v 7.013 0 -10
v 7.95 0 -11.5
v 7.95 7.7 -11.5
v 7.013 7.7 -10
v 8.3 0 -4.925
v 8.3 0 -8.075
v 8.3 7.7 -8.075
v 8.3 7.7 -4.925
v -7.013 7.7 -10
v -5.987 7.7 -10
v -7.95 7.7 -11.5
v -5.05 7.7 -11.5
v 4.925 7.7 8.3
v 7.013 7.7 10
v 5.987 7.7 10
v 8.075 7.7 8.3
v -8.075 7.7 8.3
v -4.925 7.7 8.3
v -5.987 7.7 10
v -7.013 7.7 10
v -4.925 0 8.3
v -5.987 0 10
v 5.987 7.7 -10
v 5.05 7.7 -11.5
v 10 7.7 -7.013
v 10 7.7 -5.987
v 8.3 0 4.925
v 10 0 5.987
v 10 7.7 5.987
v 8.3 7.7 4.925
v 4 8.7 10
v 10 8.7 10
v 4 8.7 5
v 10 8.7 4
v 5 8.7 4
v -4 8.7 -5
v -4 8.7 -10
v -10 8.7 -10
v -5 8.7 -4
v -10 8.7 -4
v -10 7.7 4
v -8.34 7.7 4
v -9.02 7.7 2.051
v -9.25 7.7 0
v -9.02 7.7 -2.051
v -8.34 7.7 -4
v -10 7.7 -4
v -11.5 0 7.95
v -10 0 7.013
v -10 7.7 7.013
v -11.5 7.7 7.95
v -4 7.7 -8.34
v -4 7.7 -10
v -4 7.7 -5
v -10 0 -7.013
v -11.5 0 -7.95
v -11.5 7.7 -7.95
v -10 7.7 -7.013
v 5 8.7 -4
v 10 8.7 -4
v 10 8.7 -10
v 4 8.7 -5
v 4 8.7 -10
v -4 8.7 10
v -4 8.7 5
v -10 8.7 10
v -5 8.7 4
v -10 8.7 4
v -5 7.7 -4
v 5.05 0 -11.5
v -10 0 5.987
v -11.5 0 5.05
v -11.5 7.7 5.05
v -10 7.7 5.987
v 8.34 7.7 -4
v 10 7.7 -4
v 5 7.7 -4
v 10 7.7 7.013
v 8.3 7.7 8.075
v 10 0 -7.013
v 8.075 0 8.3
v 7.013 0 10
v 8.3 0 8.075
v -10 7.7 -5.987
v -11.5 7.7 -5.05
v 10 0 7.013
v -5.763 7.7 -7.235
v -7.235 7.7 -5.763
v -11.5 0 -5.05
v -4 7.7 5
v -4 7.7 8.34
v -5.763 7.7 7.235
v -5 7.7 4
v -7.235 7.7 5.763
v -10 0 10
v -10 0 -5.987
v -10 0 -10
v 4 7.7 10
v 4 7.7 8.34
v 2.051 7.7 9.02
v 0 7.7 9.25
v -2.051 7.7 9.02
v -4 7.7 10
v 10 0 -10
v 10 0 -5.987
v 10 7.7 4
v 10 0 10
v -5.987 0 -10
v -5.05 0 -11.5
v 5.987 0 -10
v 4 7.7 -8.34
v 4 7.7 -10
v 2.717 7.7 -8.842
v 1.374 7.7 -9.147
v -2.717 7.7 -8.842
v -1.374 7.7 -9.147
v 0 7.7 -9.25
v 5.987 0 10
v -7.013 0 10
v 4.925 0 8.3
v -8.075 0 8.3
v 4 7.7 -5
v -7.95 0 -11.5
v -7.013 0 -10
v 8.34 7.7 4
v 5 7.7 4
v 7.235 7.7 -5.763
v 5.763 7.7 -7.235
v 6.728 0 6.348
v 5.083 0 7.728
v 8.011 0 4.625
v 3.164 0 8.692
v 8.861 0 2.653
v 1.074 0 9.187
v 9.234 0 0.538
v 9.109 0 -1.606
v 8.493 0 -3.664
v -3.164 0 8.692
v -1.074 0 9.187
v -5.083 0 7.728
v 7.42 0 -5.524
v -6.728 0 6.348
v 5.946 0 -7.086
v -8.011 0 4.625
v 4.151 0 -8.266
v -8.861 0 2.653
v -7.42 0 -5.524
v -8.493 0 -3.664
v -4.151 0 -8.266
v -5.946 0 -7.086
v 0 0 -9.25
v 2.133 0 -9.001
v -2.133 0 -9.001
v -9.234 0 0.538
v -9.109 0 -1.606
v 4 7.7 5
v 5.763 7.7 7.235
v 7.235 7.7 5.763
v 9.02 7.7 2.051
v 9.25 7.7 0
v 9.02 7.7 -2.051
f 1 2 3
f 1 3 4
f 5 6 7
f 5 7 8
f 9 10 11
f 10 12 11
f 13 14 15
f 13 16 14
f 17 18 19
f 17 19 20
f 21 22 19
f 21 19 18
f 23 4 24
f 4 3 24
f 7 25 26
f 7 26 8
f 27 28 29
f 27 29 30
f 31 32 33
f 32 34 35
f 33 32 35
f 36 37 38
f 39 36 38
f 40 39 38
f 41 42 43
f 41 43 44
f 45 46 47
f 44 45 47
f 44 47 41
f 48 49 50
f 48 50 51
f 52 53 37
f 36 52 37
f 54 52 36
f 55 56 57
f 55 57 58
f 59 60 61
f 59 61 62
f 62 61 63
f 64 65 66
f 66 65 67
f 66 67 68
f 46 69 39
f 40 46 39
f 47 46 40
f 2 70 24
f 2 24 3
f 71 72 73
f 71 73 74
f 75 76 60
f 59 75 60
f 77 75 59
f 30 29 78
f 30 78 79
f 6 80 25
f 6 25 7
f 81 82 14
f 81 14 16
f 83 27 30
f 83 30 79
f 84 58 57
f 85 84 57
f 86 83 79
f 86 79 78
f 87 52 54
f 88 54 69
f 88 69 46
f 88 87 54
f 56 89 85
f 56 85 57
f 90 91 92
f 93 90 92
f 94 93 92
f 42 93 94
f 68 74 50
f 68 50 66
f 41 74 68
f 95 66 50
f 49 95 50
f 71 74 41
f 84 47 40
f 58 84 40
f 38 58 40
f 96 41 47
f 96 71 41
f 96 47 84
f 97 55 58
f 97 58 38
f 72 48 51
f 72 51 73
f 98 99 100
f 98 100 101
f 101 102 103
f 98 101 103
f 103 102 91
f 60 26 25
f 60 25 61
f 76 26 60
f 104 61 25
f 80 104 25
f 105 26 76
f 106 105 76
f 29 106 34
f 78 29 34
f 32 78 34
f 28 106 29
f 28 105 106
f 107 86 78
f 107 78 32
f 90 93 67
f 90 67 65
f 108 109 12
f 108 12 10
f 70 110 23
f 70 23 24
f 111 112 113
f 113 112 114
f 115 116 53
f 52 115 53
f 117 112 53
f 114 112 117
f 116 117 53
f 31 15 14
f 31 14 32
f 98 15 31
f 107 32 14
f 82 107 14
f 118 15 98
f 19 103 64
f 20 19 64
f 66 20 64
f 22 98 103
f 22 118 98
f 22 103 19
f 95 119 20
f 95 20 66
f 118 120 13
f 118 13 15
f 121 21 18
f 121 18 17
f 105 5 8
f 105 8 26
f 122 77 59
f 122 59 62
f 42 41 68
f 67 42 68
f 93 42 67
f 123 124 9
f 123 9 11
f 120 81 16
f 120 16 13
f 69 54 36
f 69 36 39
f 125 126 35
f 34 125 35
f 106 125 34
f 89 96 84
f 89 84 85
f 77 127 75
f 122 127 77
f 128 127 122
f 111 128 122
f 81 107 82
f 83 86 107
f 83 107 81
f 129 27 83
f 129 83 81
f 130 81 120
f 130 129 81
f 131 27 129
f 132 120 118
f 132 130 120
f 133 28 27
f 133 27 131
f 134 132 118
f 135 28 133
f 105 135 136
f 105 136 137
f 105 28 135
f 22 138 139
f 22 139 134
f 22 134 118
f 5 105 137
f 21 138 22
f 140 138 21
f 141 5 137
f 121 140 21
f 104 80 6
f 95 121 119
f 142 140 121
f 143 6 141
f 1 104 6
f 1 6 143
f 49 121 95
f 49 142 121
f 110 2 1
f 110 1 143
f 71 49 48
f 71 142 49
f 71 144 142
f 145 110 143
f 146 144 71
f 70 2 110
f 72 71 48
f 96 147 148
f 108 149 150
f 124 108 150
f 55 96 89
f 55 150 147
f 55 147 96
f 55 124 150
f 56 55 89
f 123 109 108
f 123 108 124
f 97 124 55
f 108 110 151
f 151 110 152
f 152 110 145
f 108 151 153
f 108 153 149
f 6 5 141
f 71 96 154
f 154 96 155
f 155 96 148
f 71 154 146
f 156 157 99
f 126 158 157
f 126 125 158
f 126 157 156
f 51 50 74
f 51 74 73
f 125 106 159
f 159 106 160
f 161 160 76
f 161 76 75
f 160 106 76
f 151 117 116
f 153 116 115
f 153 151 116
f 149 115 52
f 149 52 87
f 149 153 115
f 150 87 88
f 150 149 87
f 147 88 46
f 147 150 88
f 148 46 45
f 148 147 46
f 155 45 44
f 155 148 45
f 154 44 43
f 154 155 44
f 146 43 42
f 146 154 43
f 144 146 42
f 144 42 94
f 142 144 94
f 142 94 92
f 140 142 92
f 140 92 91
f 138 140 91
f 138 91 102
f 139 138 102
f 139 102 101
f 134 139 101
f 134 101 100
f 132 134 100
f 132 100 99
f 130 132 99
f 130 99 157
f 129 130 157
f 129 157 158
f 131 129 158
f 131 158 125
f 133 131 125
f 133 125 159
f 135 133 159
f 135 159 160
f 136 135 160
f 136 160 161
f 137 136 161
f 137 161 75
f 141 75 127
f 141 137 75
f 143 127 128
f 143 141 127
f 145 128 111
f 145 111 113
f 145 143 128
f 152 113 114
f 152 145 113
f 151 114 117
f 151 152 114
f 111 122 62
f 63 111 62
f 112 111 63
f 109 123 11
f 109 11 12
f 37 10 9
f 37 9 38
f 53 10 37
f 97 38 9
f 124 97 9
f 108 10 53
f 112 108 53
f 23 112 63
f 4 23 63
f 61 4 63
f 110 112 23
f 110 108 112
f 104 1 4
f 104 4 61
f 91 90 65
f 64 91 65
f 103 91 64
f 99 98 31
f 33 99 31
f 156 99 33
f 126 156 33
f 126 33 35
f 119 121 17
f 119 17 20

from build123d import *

# Parameters (mm, degrees)
SKETCH1_R           = 9.25
BOSS_EXTRUDE1_DEPTH = 7.7
BOSS_EXTRUDE2_DEPTH = 1


with BuildPart() as part:
    # Sketch1 → Boss-Extrude1 (new body)
    with BuildSketch(Plane(origin=(0, 0, 0), x_dir=(1, 0, 0), z_dir=(0, 1, 0))):
        Polygon((-7.012695972, 10), (-7.95, 11.5), (-5.05, 11.5), (-5.987304028, 10), (5.987304028, 10), (5.05, 11.5), (7.95, 11.5), (7.012695972, 10), (10, 10), (10, 7.012695972), (8.3, 8.07497387), (8.3, 4.92502613), (10, 5.987304028), (10, -5.987304028), (8.3, -4.92502613), (8.3, -8.07497387), (10, -7.012695972), (10, -10), (7.012695972, -10), (8.07497387, -8.3), (4.92502613, -8.3), (5.987304028, -10), (-5.987304028, -10), (-4.92502613, -8.3), (-8.07497387, -8.3), (-7.012695972, -10), (-10, -10), (-10, -7.012695972), (-11.5, -7.95), (-11.5, -5.05), (-10, -5.987304028), (-10, 5.987304028), (-11.5, 5.05), (-11.5, 7.95), (-10, 7.012695972), (-10, 10), align=None)
        with Locations(Location((0, 0, 0), (0, 0, 90))):
            Circle(SKETCH1_R, mode=Mode.SUBTRACT)
    extrude(amount=BOSS_EXTRUDE1_DEPTH)

    # Sketch2 → Boss-Extrude2 (add)
    with BuildSketch(Plane(origin=(0, 7.7, 0), x_dir=(1, 0, 0), z_dir=(0, 1, 0))):
        Polygon((-5, -4), (-4, -5), (-4, -10), (-10, -10), (-10, -4), align=None)
        Polygon((-4, 10), (-4, 5), (-5, 4), (-10, 4), (-10, 10), align=None)
        Polygon((10, 4), (5, 4), (4, 5), (4, 10), (10, 10), align=None)
        Polygon((4, -10), (4, -5), (5, -4), (10, -4), (10, -10), align=None)
    extrude(amount=BOSS_EXTRUDE2_DEPTH)


solid = part.part
